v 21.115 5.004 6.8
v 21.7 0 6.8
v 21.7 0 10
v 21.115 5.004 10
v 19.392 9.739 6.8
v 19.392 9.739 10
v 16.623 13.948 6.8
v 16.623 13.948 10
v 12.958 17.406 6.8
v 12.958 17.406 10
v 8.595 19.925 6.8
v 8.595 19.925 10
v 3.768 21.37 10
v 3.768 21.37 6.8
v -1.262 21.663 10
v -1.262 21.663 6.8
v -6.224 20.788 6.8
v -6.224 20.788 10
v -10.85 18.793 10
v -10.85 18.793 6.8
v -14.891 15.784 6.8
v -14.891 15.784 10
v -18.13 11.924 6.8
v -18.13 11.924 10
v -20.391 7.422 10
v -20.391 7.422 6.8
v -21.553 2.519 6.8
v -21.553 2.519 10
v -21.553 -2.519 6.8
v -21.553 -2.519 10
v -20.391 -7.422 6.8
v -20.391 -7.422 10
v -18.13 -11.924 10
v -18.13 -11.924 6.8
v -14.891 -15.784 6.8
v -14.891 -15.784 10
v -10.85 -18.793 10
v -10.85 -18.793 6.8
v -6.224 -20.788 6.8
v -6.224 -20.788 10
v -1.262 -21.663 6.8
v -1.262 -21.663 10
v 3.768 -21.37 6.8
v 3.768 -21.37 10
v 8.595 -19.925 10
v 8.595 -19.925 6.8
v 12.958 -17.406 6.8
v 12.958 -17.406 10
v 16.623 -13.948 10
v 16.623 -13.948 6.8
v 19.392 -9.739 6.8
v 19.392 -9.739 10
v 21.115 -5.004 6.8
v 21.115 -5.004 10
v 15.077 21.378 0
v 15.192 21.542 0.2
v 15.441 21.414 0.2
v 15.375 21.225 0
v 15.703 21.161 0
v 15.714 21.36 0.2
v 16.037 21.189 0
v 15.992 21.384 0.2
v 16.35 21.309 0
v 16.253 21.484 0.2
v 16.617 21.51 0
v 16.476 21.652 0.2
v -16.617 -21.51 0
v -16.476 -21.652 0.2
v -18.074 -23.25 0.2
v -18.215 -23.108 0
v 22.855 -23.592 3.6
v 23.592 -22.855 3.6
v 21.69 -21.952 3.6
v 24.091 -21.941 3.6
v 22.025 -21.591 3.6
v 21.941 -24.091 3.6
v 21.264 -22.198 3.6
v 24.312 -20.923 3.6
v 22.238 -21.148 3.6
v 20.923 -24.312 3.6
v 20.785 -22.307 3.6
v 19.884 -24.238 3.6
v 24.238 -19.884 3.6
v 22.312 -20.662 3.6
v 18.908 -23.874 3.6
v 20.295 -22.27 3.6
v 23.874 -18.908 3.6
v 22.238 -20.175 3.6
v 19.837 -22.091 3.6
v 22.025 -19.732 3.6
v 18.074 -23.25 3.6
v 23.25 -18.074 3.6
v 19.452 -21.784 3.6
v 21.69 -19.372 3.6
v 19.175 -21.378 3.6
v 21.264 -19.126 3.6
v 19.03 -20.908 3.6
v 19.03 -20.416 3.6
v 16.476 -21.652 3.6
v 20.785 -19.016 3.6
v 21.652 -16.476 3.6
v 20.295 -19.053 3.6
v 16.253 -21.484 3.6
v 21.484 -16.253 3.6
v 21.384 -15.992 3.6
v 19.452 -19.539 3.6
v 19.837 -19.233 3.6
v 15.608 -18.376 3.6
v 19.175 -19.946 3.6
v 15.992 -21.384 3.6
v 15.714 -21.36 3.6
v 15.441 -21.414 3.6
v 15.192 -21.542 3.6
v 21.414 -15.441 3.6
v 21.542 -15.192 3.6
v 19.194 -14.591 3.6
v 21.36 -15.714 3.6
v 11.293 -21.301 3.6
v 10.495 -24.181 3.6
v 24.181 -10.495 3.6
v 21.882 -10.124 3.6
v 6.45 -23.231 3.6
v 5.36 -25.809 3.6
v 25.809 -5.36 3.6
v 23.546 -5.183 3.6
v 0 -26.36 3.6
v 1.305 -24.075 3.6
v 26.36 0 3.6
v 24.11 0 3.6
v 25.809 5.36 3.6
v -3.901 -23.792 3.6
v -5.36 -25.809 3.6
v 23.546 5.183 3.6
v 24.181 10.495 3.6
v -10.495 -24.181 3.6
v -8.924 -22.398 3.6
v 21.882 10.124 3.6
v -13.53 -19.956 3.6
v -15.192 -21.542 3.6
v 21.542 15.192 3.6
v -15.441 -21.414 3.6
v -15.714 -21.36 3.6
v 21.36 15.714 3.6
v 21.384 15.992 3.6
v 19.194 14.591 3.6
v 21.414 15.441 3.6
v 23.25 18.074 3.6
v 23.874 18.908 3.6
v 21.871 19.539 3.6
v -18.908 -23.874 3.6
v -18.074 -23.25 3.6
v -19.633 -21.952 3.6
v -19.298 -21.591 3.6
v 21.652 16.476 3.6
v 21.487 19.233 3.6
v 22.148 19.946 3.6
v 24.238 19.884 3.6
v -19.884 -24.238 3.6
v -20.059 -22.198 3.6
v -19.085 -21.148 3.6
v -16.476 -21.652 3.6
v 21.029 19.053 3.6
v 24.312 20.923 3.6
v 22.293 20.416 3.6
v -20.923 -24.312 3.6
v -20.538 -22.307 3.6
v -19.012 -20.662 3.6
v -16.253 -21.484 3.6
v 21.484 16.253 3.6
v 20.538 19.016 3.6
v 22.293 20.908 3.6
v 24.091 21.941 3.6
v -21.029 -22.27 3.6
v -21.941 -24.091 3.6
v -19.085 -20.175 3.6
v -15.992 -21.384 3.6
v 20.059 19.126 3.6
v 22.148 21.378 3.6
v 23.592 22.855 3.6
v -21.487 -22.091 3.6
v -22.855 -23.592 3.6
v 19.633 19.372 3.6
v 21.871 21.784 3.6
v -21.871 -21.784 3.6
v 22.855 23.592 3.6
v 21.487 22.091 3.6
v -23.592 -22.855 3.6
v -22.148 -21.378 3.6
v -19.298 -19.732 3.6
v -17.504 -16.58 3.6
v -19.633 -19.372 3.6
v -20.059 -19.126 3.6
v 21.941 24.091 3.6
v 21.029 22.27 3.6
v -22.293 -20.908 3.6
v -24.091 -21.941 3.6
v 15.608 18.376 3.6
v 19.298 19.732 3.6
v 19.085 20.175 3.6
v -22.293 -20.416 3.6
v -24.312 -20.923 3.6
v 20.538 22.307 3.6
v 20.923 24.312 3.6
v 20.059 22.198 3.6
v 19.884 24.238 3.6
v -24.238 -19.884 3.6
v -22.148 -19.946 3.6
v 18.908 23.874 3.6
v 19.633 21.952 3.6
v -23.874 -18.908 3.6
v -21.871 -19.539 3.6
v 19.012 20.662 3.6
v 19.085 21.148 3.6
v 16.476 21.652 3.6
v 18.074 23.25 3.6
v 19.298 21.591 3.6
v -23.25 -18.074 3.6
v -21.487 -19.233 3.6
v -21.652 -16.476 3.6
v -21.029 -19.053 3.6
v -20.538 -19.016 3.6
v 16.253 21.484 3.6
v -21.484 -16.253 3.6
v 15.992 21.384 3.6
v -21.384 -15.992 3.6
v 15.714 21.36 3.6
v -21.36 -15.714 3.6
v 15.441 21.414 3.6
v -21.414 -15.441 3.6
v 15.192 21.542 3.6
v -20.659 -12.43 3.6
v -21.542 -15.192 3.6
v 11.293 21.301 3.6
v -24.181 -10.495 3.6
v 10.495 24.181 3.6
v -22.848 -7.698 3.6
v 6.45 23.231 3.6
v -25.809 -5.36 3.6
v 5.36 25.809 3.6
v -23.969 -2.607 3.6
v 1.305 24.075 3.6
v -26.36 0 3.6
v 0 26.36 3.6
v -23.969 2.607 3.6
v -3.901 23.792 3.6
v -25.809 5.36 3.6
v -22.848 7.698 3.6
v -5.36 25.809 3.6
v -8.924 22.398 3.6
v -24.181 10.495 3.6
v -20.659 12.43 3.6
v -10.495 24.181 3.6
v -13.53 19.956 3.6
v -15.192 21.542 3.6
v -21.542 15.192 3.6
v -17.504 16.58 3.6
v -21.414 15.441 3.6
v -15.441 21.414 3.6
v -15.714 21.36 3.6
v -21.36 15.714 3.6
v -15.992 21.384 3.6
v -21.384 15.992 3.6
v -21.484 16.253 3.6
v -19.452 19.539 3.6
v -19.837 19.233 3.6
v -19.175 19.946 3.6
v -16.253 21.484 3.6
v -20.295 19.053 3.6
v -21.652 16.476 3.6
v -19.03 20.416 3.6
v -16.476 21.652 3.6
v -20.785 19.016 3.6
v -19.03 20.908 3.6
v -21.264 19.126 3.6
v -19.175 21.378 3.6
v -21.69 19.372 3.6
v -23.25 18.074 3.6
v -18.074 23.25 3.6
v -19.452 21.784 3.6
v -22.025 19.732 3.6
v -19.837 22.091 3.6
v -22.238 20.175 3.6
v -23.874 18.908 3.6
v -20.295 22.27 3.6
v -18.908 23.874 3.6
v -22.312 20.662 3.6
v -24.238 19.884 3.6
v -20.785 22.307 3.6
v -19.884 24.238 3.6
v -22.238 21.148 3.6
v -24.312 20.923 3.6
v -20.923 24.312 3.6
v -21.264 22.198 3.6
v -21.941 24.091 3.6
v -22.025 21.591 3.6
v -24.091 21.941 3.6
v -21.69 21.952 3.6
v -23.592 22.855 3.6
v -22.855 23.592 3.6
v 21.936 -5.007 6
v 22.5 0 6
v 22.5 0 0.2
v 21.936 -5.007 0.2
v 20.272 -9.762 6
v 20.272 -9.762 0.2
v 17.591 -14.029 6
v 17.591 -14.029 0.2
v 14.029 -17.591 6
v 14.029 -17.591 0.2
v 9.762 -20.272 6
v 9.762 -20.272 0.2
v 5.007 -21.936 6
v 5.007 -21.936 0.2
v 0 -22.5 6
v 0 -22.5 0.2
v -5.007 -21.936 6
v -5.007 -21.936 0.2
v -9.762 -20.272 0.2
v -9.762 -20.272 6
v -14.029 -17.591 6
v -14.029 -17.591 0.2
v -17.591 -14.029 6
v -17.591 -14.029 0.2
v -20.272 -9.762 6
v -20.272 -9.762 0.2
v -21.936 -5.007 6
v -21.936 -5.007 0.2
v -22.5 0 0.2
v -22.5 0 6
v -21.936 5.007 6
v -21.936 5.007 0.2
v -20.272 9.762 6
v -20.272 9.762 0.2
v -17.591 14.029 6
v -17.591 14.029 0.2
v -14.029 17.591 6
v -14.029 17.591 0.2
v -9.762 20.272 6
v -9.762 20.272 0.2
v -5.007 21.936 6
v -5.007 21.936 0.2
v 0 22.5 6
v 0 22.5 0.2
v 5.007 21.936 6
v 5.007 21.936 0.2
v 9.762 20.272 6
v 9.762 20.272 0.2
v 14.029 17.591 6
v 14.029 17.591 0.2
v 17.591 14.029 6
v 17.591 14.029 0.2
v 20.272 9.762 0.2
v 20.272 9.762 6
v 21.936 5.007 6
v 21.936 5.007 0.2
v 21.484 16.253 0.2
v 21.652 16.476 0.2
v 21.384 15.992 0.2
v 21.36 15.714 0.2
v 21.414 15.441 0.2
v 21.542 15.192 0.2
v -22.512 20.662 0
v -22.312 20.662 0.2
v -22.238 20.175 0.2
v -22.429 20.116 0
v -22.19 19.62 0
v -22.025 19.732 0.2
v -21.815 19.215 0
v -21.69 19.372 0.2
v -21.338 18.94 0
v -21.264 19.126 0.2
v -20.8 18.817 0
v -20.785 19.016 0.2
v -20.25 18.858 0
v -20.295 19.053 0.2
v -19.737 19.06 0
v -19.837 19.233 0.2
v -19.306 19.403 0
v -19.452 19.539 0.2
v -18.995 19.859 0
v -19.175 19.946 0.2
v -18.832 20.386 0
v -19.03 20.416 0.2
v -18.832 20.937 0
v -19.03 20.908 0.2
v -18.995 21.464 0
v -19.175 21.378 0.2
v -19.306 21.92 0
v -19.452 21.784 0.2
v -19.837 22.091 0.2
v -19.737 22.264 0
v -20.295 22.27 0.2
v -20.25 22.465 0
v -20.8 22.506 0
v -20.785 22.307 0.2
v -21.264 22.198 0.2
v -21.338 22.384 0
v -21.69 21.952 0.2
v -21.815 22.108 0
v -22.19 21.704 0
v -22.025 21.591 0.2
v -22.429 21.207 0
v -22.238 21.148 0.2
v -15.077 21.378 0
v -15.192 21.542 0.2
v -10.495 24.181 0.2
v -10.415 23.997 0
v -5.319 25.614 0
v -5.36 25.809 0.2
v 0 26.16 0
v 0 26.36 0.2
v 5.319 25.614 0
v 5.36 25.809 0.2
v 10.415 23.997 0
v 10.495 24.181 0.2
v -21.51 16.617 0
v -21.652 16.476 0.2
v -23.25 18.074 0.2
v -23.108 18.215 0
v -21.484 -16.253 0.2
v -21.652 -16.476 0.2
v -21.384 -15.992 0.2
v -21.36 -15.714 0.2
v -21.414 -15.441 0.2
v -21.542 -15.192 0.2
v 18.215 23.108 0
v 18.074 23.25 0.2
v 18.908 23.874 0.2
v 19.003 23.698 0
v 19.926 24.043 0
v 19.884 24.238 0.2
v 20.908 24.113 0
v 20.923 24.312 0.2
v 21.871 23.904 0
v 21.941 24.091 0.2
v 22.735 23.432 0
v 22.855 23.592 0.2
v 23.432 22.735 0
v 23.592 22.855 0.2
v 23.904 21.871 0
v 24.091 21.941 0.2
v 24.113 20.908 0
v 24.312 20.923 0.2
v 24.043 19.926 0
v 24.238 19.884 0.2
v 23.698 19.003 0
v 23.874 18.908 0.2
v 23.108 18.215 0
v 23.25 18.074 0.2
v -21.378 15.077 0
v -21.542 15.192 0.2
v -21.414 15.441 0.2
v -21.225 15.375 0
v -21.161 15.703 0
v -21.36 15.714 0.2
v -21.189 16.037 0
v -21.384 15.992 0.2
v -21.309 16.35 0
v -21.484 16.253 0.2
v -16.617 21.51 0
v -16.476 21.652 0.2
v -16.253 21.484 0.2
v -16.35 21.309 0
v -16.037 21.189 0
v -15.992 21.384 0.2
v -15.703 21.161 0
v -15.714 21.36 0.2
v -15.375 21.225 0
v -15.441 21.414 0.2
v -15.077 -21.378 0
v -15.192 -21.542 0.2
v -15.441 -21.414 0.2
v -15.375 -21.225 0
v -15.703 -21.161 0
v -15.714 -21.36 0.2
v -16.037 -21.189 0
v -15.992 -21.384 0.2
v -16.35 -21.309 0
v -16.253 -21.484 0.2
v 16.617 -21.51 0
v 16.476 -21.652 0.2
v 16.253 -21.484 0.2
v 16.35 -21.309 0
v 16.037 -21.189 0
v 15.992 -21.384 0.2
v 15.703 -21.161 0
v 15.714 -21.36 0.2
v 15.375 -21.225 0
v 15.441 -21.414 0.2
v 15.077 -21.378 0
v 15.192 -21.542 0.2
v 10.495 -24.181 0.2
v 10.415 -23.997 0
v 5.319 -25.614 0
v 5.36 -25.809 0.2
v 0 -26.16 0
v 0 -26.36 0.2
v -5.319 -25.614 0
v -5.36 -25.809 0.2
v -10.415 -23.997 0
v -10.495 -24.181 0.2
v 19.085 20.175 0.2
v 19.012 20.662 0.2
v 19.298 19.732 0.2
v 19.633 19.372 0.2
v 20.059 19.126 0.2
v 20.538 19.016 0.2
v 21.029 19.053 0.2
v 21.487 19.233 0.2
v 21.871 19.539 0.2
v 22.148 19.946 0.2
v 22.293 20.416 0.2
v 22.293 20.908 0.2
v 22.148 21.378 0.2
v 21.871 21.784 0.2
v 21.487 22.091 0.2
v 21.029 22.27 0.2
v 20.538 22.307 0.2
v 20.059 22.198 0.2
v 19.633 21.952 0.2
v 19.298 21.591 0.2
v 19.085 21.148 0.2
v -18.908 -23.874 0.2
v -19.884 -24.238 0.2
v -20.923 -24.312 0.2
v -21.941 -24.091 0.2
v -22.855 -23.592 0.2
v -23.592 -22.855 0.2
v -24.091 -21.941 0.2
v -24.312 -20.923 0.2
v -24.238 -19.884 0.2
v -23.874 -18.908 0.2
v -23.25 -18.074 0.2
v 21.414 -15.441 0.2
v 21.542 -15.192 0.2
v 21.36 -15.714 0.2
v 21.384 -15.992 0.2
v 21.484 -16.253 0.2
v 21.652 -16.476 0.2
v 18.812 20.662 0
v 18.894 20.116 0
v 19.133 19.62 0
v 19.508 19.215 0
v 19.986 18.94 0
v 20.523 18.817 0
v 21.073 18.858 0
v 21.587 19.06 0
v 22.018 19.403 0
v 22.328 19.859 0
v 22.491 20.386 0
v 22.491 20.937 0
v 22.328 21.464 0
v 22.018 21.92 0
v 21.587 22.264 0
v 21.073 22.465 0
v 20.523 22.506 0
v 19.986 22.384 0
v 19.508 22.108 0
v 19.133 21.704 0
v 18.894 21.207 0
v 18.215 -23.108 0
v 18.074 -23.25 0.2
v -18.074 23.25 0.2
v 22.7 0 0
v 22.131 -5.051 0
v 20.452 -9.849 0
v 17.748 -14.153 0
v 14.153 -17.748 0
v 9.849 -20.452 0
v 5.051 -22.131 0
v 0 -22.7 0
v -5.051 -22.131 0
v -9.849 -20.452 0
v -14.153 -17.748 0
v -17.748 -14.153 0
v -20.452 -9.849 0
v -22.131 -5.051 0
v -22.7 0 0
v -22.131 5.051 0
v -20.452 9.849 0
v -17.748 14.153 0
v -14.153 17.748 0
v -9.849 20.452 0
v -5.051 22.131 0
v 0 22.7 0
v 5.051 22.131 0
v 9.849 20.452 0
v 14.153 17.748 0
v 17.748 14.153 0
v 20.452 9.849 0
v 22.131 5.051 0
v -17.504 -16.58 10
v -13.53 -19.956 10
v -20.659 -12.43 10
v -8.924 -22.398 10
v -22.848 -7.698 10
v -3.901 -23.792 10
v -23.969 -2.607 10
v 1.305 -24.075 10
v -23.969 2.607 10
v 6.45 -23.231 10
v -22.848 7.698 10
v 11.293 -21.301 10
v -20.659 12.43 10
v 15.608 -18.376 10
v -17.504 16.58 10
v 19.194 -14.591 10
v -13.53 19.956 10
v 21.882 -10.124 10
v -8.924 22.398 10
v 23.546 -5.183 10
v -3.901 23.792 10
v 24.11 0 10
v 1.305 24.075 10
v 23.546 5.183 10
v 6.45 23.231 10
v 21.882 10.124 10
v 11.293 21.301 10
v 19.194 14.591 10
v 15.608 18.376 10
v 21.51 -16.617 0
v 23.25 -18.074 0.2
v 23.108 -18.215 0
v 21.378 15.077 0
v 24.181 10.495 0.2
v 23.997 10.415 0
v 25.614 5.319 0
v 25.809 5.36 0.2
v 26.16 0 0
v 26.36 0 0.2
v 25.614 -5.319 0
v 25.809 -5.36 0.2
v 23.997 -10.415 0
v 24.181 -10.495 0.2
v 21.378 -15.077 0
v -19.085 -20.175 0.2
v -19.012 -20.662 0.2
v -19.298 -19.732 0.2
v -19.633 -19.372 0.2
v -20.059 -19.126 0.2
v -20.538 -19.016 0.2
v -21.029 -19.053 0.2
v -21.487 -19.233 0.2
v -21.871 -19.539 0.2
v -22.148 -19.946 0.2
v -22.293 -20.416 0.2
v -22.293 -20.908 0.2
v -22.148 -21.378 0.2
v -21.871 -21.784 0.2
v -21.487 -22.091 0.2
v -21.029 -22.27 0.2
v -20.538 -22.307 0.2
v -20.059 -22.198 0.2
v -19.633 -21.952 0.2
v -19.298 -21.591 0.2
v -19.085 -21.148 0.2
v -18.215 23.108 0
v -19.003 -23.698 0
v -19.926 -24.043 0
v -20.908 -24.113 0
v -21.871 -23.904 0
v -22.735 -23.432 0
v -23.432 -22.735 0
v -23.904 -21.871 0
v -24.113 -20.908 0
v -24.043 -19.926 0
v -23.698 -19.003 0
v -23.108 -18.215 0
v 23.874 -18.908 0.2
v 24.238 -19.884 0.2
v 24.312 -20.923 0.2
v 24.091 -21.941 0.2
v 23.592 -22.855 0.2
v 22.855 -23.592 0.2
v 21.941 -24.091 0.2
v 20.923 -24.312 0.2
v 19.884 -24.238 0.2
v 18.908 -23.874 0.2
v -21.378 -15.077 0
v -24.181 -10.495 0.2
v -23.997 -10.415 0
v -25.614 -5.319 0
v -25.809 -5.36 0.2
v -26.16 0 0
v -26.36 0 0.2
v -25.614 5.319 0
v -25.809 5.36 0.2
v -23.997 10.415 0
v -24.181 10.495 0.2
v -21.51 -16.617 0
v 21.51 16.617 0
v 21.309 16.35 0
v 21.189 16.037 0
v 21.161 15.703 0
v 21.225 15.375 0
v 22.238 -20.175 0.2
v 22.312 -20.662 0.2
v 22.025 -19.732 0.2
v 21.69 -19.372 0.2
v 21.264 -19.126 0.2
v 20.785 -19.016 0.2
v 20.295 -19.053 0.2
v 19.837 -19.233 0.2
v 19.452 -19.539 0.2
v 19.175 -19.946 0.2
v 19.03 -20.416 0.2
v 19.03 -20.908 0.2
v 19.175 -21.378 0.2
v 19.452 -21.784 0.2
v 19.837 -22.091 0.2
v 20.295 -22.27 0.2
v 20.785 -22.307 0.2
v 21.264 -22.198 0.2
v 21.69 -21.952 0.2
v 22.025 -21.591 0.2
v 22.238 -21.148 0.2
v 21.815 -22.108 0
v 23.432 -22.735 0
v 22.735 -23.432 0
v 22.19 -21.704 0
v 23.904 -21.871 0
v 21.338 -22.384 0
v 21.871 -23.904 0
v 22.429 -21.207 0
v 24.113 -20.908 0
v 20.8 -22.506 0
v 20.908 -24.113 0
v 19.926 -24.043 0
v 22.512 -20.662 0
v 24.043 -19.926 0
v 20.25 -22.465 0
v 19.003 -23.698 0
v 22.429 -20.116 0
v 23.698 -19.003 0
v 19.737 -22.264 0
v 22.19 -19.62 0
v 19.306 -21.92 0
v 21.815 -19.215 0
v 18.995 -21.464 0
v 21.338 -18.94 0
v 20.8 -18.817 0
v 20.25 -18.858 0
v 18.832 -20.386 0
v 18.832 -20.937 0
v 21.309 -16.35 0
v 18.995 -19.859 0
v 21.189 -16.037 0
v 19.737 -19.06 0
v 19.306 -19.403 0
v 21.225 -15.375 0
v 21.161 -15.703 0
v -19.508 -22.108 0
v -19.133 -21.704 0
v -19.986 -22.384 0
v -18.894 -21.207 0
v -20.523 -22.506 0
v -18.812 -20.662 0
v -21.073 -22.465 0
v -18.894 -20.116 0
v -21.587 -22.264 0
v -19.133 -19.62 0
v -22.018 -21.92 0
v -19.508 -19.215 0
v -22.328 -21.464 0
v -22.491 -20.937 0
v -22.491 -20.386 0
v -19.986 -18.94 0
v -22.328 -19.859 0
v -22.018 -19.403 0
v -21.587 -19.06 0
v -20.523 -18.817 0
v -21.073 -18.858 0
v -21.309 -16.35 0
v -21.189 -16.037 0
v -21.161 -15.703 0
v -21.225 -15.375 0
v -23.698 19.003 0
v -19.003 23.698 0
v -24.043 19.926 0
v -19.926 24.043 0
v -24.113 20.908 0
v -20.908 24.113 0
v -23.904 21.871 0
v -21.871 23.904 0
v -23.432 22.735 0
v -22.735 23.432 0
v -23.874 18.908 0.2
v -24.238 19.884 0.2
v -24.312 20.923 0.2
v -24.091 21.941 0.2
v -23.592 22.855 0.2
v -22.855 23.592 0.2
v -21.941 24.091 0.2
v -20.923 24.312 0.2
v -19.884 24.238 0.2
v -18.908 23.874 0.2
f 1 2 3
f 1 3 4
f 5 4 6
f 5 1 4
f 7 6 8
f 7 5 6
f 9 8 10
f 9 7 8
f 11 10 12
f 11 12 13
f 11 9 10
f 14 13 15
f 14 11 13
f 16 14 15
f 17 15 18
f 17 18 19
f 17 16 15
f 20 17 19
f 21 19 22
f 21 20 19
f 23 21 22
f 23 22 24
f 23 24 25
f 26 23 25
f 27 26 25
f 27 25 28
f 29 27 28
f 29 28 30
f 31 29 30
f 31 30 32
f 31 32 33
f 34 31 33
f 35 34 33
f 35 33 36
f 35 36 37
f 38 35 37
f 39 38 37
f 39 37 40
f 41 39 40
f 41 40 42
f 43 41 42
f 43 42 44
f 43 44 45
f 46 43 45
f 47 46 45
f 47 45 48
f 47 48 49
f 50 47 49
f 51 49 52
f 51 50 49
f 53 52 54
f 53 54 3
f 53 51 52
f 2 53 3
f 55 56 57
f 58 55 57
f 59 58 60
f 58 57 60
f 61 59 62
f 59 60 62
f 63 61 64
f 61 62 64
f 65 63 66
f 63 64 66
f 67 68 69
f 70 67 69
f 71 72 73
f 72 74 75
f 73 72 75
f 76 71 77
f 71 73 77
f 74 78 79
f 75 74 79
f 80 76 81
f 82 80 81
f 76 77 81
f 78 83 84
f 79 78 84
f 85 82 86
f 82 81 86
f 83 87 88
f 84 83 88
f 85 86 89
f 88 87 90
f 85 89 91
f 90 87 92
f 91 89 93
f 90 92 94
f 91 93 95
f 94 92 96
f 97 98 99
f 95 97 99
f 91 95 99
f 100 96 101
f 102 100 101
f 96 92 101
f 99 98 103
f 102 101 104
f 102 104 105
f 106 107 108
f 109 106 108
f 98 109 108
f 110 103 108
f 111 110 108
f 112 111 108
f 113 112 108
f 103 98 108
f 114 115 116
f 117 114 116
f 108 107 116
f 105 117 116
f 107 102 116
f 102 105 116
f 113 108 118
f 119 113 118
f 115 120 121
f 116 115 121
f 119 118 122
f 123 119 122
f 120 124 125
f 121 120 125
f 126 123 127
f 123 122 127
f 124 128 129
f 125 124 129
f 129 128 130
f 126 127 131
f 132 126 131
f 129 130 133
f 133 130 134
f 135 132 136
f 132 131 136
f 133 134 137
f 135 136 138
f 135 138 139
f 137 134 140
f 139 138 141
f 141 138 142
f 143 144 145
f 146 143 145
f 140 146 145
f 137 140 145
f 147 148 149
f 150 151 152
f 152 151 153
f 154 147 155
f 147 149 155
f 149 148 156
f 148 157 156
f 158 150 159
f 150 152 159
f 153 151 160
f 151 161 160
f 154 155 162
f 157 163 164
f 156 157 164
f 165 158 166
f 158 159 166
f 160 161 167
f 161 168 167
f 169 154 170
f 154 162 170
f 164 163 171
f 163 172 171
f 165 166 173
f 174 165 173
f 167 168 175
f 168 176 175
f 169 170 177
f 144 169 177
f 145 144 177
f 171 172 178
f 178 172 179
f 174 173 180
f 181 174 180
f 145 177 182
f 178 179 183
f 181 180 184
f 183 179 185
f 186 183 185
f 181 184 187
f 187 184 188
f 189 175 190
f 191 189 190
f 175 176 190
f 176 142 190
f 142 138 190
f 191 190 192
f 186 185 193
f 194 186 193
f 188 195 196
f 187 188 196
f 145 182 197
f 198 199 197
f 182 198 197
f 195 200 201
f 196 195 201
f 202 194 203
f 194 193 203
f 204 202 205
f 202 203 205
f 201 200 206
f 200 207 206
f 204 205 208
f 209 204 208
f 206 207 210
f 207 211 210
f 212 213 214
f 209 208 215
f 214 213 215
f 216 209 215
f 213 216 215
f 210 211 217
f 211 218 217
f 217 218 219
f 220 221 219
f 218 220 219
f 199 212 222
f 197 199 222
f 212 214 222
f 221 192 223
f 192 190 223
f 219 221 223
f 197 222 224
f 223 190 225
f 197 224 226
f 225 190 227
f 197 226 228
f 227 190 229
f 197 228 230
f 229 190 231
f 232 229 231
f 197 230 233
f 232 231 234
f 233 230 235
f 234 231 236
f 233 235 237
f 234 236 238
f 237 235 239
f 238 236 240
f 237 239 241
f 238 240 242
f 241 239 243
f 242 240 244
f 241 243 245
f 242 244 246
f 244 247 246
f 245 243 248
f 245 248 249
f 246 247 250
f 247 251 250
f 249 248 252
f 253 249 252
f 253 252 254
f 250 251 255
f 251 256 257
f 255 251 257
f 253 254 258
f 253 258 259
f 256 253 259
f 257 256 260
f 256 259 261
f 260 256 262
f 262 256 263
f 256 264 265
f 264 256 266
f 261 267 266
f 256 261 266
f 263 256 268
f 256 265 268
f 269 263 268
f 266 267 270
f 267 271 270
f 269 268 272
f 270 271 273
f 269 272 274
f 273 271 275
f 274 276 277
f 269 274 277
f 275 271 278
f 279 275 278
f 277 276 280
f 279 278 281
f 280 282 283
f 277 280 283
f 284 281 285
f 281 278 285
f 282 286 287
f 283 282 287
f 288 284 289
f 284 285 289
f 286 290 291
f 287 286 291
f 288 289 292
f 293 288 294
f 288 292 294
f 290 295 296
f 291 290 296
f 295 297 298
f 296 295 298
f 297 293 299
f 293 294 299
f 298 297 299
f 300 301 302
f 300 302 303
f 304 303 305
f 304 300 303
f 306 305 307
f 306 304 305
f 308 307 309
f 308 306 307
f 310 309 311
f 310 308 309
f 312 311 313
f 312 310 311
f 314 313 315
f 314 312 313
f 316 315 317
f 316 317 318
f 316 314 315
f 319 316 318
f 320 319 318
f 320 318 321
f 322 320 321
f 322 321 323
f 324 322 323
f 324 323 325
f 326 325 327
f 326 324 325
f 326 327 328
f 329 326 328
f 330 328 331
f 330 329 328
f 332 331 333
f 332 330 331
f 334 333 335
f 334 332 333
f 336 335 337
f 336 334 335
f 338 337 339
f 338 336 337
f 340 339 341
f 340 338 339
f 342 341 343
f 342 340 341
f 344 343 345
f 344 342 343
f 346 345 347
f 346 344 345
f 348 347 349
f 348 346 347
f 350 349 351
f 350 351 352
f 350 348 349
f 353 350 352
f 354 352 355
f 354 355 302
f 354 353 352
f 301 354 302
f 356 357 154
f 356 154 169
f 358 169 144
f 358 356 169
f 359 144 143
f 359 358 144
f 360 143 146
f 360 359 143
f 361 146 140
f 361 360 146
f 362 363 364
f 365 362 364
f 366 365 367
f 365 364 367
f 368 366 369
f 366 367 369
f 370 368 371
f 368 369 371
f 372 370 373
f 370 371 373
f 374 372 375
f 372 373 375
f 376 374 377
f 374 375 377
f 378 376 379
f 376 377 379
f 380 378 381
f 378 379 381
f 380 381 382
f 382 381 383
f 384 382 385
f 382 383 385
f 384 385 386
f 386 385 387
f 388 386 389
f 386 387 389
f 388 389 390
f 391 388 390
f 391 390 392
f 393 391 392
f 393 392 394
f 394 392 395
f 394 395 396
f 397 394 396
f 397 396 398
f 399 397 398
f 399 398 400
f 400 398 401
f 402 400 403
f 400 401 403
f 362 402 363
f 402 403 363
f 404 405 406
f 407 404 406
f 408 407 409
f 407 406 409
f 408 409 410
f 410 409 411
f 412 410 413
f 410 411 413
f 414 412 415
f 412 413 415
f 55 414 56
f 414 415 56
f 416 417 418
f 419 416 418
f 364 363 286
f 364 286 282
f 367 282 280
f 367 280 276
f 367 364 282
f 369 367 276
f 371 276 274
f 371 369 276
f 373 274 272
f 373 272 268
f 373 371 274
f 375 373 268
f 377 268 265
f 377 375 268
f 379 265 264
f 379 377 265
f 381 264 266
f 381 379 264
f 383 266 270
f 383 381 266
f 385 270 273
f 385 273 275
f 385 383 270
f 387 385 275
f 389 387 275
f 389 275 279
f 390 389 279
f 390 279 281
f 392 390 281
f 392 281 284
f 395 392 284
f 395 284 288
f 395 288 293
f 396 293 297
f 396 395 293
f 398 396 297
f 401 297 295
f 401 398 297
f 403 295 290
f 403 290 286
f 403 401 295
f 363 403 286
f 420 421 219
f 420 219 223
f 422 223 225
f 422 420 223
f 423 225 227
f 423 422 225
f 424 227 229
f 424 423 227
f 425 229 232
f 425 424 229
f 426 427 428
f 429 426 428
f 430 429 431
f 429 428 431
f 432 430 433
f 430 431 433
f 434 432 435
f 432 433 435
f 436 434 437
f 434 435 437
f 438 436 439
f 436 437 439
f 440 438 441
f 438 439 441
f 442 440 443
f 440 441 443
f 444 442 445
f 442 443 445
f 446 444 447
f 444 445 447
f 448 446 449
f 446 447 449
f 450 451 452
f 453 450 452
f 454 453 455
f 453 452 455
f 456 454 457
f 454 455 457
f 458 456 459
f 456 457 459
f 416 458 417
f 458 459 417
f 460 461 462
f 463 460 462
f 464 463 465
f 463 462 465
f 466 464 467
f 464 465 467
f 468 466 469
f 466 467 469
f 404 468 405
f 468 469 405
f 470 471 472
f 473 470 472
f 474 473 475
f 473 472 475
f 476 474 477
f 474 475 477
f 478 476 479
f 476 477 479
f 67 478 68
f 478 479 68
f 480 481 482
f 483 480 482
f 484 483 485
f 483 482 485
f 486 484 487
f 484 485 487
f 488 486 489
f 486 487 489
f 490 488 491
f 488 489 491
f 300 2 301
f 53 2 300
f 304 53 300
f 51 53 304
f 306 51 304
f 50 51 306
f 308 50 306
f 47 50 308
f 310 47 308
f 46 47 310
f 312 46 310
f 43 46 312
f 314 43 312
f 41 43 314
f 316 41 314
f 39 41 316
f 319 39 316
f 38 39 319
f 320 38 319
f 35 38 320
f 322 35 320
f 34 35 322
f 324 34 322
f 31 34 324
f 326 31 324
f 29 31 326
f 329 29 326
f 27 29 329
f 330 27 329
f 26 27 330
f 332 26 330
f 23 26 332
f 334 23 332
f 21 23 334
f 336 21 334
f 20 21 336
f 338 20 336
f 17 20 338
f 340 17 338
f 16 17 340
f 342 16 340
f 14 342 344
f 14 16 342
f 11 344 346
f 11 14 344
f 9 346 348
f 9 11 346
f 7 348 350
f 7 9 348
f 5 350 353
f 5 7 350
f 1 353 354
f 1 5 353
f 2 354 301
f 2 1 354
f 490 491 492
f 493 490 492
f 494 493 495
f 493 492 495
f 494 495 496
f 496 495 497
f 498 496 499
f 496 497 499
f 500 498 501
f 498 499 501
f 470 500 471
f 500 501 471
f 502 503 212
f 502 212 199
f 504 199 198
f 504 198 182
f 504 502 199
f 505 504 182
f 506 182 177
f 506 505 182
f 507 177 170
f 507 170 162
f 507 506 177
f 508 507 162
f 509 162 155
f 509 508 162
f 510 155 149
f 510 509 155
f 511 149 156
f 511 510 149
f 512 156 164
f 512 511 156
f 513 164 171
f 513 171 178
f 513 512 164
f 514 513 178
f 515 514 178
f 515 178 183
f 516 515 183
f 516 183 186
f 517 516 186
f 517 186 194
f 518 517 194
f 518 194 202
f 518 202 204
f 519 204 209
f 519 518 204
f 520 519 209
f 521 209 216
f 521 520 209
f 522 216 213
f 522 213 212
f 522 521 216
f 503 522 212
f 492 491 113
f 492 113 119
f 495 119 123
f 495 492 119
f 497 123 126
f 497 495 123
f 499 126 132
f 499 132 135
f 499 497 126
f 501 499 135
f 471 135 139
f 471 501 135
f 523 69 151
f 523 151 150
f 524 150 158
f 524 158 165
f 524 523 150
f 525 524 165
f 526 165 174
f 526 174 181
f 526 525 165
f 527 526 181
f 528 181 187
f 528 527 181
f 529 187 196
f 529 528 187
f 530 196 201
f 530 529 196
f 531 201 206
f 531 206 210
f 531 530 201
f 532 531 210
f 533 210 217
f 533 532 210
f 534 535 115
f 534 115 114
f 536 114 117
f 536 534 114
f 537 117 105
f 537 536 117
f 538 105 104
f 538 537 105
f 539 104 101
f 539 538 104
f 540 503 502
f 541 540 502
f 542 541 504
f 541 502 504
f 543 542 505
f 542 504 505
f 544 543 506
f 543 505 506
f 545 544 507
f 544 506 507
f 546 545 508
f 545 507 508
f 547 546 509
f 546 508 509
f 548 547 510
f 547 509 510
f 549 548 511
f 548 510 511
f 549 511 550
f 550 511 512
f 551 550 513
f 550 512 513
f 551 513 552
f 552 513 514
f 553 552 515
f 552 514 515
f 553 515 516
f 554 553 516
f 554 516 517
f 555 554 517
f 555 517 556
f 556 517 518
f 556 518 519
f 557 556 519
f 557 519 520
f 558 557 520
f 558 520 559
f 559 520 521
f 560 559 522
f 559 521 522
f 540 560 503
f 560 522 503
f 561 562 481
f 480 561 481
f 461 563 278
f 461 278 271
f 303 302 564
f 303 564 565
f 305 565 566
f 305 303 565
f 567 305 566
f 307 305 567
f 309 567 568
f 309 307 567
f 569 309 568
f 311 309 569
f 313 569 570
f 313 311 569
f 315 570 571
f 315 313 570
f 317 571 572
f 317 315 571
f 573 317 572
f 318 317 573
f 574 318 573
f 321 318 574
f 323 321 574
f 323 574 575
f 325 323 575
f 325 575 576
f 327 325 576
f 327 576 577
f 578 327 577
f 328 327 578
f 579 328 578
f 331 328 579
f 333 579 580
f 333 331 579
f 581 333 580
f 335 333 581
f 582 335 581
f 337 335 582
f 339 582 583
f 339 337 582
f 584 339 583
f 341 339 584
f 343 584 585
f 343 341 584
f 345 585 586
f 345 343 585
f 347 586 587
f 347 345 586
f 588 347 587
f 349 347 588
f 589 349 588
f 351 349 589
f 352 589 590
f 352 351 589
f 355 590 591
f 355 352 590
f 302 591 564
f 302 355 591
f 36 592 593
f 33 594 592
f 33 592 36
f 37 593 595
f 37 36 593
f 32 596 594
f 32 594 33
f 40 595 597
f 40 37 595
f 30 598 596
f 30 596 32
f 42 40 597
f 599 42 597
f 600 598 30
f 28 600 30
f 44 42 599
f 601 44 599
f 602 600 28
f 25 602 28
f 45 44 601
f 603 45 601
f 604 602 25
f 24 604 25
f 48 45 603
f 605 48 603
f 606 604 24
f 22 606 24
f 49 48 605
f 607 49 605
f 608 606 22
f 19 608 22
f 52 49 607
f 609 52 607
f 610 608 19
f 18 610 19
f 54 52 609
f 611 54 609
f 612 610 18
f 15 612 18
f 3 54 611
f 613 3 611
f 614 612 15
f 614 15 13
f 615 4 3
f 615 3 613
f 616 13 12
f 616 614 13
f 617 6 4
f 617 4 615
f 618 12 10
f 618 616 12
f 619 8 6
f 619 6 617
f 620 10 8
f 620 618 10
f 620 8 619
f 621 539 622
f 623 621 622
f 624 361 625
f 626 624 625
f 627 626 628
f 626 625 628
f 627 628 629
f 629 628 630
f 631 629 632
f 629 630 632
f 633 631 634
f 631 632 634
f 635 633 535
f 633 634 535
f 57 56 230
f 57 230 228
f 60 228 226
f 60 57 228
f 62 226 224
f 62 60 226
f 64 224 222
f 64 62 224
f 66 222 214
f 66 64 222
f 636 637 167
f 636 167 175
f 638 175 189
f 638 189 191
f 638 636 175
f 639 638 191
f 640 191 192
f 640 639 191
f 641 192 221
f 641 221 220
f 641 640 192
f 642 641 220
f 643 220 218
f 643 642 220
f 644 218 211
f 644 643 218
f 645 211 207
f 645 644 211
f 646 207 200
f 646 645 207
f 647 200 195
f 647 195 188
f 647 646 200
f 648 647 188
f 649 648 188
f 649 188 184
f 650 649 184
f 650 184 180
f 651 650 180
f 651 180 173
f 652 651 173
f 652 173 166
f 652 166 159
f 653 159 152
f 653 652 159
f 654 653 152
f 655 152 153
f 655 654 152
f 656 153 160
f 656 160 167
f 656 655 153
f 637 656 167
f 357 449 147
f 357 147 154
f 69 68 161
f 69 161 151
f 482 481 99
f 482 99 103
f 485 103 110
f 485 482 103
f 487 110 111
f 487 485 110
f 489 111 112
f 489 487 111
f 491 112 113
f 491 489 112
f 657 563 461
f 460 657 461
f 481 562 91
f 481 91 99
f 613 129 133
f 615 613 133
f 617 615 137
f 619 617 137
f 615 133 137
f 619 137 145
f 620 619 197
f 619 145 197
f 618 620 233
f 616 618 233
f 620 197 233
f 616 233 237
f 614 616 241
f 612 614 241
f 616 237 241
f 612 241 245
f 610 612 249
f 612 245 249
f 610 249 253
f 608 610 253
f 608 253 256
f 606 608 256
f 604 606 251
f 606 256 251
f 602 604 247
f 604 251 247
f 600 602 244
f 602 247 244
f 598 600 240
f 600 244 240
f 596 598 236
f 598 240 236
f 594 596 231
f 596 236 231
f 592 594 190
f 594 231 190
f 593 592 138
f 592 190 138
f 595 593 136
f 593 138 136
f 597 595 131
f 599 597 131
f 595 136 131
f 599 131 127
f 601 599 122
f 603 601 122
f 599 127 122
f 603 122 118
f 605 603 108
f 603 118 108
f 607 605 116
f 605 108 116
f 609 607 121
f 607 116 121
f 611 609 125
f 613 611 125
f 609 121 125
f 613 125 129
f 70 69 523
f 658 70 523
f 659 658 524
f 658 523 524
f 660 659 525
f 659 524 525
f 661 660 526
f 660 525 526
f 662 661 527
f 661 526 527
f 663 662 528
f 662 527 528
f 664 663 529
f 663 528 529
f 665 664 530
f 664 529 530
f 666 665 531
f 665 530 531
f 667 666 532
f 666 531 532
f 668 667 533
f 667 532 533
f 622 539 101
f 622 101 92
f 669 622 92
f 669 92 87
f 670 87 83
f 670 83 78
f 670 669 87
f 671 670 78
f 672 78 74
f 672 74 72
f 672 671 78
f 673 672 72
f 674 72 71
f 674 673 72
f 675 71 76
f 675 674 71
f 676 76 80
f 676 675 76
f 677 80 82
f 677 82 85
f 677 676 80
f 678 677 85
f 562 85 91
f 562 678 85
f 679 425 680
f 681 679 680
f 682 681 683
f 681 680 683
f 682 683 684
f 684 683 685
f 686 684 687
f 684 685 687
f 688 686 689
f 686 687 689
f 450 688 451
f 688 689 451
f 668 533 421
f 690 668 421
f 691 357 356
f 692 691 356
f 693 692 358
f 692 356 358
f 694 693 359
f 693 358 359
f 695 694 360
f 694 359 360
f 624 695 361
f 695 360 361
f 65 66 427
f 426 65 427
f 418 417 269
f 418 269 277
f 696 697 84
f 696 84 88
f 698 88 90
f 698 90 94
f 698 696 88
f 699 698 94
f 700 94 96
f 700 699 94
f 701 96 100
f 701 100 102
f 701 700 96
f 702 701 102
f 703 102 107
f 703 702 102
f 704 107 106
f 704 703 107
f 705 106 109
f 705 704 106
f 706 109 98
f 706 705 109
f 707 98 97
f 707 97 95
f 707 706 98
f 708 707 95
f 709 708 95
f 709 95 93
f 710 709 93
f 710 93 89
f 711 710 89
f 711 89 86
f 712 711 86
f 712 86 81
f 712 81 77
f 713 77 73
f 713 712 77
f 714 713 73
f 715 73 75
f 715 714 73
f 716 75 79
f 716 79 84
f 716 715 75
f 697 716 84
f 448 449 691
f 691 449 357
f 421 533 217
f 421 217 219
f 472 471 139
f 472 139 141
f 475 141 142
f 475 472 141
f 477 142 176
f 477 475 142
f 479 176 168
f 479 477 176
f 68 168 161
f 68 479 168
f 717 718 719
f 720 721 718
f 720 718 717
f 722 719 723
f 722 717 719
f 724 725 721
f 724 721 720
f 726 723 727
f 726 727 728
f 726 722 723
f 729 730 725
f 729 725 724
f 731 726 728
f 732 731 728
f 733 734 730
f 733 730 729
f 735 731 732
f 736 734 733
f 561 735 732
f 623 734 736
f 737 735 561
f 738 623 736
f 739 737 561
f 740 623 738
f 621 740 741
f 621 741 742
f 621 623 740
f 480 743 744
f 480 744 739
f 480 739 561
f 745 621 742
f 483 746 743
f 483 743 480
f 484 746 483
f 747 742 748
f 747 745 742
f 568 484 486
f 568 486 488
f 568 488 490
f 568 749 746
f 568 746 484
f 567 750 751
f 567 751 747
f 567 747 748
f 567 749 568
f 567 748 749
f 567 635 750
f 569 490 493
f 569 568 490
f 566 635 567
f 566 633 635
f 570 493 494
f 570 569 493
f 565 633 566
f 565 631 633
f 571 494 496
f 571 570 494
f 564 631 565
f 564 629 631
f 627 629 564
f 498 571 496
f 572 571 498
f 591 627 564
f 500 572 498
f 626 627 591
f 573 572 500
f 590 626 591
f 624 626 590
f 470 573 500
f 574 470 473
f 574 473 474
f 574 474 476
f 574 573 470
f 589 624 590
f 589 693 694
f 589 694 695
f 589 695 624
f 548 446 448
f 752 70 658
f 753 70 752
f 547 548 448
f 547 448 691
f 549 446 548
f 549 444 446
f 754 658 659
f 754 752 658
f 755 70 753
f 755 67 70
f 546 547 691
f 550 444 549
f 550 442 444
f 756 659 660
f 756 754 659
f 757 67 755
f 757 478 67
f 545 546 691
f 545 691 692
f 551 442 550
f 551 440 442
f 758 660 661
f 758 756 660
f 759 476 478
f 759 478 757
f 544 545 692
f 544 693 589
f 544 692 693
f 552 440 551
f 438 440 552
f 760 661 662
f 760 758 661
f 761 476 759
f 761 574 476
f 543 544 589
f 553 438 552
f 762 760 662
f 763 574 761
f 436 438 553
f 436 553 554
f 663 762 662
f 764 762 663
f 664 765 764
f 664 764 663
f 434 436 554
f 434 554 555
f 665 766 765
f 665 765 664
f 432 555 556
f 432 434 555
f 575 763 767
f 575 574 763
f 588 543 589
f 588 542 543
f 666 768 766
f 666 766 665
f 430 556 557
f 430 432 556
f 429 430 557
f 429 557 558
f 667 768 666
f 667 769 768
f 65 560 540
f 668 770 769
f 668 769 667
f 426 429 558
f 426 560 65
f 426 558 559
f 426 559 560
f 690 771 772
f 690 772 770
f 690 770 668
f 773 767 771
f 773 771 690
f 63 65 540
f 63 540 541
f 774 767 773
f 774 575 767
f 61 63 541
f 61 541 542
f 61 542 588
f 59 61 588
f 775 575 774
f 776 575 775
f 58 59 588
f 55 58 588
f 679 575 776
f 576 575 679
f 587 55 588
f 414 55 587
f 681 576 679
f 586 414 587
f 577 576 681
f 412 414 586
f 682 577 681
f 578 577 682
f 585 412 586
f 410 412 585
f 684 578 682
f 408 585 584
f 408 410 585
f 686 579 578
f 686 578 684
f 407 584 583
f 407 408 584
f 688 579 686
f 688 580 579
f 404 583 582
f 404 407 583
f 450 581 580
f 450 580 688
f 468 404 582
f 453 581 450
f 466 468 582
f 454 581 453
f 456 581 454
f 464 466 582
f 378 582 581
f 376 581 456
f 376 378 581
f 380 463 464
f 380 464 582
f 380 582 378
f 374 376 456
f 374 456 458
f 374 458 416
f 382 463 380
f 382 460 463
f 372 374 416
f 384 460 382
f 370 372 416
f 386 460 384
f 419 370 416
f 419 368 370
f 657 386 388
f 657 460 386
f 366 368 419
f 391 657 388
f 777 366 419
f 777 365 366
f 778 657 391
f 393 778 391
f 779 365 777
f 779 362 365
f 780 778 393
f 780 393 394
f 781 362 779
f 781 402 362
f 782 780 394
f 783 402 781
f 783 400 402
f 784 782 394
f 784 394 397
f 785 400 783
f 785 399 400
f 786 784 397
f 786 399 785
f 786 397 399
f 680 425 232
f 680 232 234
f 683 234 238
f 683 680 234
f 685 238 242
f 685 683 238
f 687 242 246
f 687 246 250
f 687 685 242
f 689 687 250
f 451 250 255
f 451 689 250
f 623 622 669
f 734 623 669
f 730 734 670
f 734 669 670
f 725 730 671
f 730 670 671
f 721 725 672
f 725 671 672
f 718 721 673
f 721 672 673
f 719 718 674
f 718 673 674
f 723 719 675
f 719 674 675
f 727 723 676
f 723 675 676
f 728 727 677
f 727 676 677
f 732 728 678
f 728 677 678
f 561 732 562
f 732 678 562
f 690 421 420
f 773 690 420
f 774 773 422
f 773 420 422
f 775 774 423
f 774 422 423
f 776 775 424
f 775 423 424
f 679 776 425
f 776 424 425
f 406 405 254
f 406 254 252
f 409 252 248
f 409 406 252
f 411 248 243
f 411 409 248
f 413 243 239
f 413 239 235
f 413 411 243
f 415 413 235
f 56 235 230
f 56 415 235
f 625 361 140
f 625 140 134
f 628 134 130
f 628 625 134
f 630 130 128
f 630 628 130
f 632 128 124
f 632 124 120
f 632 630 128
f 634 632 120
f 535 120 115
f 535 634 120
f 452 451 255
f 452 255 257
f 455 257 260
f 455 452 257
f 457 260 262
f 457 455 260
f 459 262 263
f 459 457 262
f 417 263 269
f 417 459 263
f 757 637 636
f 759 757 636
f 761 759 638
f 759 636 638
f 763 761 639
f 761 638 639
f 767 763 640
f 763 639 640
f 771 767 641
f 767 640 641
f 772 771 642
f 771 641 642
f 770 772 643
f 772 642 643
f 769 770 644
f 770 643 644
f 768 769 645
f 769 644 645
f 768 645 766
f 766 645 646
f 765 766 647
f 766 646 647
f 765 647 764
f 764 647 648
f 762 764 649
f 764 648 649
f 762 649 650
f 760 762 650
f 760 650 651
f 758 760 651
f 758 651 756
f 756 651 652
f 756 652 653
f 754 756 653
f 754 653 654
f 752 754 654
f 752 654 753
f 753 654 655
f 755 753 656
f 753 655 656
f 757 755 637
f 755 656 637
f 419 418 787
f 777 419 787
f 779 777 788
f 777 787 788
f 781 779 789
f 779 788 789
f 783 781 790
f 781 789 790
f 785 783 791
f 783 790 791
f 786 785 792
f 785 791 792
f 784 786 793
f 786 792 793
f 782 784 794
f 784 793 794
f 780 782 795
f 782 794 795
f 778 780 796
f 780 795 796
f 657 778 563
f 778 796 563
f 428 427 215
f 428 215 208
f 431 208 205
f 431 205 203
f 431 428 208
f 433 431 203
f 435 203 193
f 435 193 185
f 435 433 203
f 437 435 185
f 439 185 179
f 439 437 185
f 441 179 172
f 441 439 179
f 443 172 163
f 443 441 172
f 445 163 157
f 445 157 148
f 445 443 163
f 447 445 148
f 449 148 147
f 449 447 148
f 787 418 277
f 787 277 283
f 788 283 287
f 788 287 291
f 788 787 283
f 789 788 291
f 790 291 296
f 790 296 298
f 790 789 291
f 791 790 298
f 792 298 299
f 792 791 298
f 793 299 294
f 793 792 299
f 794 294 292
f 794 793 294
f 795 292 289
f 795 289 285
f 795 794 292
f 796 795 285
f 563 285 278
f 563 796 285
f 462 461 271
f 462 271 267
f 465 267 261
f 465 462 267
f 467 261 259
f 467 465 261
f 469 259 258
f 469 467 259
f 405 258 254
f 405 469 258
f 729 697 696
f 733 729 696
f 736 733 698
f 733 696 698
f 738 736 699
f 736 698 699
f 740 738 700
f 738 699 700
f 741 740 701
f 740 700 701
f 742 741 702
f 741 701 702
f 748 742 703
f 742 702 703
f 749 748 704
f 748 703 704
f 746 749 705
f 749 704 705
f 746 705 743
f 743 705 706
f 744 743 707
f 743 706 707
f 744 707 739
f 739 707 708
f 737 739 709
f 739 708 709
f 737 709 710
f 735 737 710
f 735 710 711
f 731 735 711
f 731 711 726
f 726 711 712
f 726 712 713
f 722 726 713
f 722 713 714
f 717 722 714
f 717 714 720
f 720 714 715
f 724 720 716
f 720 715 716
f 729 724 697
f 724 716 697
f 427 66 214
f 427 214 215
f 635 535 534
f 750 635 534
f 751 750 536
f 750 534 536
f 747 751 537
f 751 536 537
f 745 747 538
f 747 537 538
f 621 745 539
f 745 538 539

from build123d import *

# Parameters (mm, degrees)
SKETCH1_R           = 1.65
SKETCH1_R_2         = 21.6
BOSS_EXTRUDE1_DEPTH = 3.6
SKETCH4_R           = 24.11
SKETCH4_R_2         = 21.7
BOSS_EXTRUDE2_DEPTH = 6.4
CHAMFER1_SIZE       = 0.2


with BuildPart() as part:
    # Sketch1 → Boss-Extrude1 (new body)
    with BuildSketch(Plane.XY):
        with BuildLine():
            Line((23.249670965, 18.073649327), (21.651772253, 16.475750615))
            ThreePointArc((21.651772253, 16.475750615), (21.3625386, 15.854117448), (21.541668543, 15.192304512))
            ThreePointArc((21.541668543, 15.192304512), (26.36, 0), (21.541668543, -15.192304512))
            ThreePointArc((21.541668543, -15.192304512), (21.3625386, -15.854117448), (21.651772253, -16.475750615))
            Line((21.651772253, -16.475750615), (23.249670965, -18.073649327))
            ThreePointArc((23.249670965, -18.073649327), (23.249670965, -23.249670965), (18.073649327, -23.249670965))
            Line((18.073649327, -23.249670965), (16.475750615, -21.651772253))
            ThreePointArc((16.475750615, -21.651772253), (15.854117448, -21.3625386), (15.192304512, -21.541668543))
            ThreePointArc((15.192304512, -21.541668543), (0, -26.36), (-15.192304512, -21.541668543))
            ThreePointArc((-15.192304512, -21.541668543), (-15.854117448, -21.3625386), (-16.475750615, -21.651772253))
            Line((-16.475750615, -21.651772253), (-18.073649327, -23.249670965))
            ThreePointArc((-18.073649327, -23.249670965), (-23.249670965, -23.249670965), (-23.249670965, -18.073649327))
            Line((-23.249670965, -18.073649327), (-21.651772253, -16.475750615))
            ThreePointArc((-21.651772253, -16.475750615), (-21.3625386, -15.854117448), (-21.541668543, -15.192304512))
            ThreePointArc((-21.541668543, -15.192304512), (-26.36, 0), (-21.541668543, 15.192304512))
            ThreePointArc((-21.541668543, 15.192304512), (-21.3625386, 15.854117448), (-21.651772253, 16.475750615))
            Line((-21.651772253, 16.475750615), (-23.249670965, 18.073649327))
            ThreePointArc((-23.249670965, 18.073649327), (-23.249670965, 23.249670965), (-18.073649327, 23.249670965))
            Line((-18.073649327, 23.249670965), (-16.475750615, 21.651772253))
            ThreePointArc((-16.475750615, 21.651772253), (-15.854117448, 21.3625386), (-15.192304512, 21.541668543))
            ThreePointArc((-15.192304512, 21.541668543), (0, 26.36), (15.192304512, 21.541668543))
            ThreePointArc((15.192304512, 21.541668543), (15.854117448, 21.3625386), (16.475750615, 21.651772253))
            Line((16.475750615, 21.651772253), (18.073649327, 23.249670965))
            ThreePointArc((18.073649327, 23.249670965), (23.249670965, 23.249670965), (23.249670965, 18.073649327))
        make_face()
        with Locations((-20.661660146, -20.661660146)):
            Circle(SKETCH1_R, mode=Mode.SUBTRACT)
        with Locations((20.661660146, -20.661660146)):
            Circle(SKETCH1_R, mode=Mode.SUBTRACT)
        Circle(SKETCH1_R_2, mode=Mode.SUBTRACT)
        with Locations(Location((20.661660146, 20.661660146, 0), (0, 0, 180))):
            Circle(SKETCH1_R, mode=Mode.SUBTRACT)
        with Locations(Location((-20.661660146, 20.661660146, 0), (0, 0, 180))):
            Circle(SKETCH1_R, mode=Mode.SUBTRACT)
    extrude(amount=BOSS_EXTRUDE1_DEPTH)

    # Sketch4 → Boss-Extrude2 (add)
    with BuildSketch(Plane.XY.offset(3.6)):
        Circle(SKETCH4_R)
        Circle(SKETCH4_R_2, mode=Mode.SUBTRACT)
    extrude(amount=BOSS_EXTRUDE2_DEPTH)

    # Sketch7 → Cut-Revolve1 (revolve, cut)
    with BuildSketch(Plane(origin=(0, 0, 0), x_dir=(1, 0, 0), z_dir=(0, 1, 0))):
        Polygon((0, -10), (0, 0), (22.5, 0), (22.5, -6), (21.7, -6.8), (21.7, -10), align=None)
    revolve(axis=Axis((0, 0, 10), (0, 0, -1)), mode=Mode.SUBTRACT)

    # Chamfer1
    chamfer1_edges = [part.edges().sort_by_distance(p)[0] for p in [
        (17.274699971, -22.450721609, 0),
        (15.854117448, -21.3625386, 0),
        (0, -26.36, 0),
        (-15.854117448, -21.3625386, 0),
        (-17.274699971, -22.450721609, 0),
        (-23.249670965, -23.249670965, 0),
        (-22.450721609, -17.274699971, 0),
        (-21.3625386, -15.854117448, 0),
        (-26.36, 0, 0),
        (-21.3625386, 15.854117448, 0),
        (-22.450721609, 17.274699971, 0),
        (-23.249670965, 23.249670965, 0),
        (-17.274699971, 22.450721609, 0),
        (-15.854117448, 21.3625386, 0),
        (0, 26.36, 0),
        (15.854117448, 21.3625386, 0),
        (17.274699971, 22.450721609, 0),
        (23.249670965, 23.249670965, 0),
        (22.450721609, 17.274699971, 0),
        (21.3625386, 15.854117448, 0),
        (26.36, 0, 0),
        (21.3625386, -15.854117448, 0),
        (22.450721609, -17.274699971, 0),
        (23.249670965, -23.249670965, 0),
        (-22.311660146, -20.661660146, 0),
        (19.011660146, -20.661660146, 0),
        (22.311660146, 20.661660146, 0),
        (-19.011660146, 20.661660146, 0),
        (-22.5, 0, 0),
    ]]
    chamfer(chamfer1_edges, length=CHAMFER1_SIZE)


solid = part.part
